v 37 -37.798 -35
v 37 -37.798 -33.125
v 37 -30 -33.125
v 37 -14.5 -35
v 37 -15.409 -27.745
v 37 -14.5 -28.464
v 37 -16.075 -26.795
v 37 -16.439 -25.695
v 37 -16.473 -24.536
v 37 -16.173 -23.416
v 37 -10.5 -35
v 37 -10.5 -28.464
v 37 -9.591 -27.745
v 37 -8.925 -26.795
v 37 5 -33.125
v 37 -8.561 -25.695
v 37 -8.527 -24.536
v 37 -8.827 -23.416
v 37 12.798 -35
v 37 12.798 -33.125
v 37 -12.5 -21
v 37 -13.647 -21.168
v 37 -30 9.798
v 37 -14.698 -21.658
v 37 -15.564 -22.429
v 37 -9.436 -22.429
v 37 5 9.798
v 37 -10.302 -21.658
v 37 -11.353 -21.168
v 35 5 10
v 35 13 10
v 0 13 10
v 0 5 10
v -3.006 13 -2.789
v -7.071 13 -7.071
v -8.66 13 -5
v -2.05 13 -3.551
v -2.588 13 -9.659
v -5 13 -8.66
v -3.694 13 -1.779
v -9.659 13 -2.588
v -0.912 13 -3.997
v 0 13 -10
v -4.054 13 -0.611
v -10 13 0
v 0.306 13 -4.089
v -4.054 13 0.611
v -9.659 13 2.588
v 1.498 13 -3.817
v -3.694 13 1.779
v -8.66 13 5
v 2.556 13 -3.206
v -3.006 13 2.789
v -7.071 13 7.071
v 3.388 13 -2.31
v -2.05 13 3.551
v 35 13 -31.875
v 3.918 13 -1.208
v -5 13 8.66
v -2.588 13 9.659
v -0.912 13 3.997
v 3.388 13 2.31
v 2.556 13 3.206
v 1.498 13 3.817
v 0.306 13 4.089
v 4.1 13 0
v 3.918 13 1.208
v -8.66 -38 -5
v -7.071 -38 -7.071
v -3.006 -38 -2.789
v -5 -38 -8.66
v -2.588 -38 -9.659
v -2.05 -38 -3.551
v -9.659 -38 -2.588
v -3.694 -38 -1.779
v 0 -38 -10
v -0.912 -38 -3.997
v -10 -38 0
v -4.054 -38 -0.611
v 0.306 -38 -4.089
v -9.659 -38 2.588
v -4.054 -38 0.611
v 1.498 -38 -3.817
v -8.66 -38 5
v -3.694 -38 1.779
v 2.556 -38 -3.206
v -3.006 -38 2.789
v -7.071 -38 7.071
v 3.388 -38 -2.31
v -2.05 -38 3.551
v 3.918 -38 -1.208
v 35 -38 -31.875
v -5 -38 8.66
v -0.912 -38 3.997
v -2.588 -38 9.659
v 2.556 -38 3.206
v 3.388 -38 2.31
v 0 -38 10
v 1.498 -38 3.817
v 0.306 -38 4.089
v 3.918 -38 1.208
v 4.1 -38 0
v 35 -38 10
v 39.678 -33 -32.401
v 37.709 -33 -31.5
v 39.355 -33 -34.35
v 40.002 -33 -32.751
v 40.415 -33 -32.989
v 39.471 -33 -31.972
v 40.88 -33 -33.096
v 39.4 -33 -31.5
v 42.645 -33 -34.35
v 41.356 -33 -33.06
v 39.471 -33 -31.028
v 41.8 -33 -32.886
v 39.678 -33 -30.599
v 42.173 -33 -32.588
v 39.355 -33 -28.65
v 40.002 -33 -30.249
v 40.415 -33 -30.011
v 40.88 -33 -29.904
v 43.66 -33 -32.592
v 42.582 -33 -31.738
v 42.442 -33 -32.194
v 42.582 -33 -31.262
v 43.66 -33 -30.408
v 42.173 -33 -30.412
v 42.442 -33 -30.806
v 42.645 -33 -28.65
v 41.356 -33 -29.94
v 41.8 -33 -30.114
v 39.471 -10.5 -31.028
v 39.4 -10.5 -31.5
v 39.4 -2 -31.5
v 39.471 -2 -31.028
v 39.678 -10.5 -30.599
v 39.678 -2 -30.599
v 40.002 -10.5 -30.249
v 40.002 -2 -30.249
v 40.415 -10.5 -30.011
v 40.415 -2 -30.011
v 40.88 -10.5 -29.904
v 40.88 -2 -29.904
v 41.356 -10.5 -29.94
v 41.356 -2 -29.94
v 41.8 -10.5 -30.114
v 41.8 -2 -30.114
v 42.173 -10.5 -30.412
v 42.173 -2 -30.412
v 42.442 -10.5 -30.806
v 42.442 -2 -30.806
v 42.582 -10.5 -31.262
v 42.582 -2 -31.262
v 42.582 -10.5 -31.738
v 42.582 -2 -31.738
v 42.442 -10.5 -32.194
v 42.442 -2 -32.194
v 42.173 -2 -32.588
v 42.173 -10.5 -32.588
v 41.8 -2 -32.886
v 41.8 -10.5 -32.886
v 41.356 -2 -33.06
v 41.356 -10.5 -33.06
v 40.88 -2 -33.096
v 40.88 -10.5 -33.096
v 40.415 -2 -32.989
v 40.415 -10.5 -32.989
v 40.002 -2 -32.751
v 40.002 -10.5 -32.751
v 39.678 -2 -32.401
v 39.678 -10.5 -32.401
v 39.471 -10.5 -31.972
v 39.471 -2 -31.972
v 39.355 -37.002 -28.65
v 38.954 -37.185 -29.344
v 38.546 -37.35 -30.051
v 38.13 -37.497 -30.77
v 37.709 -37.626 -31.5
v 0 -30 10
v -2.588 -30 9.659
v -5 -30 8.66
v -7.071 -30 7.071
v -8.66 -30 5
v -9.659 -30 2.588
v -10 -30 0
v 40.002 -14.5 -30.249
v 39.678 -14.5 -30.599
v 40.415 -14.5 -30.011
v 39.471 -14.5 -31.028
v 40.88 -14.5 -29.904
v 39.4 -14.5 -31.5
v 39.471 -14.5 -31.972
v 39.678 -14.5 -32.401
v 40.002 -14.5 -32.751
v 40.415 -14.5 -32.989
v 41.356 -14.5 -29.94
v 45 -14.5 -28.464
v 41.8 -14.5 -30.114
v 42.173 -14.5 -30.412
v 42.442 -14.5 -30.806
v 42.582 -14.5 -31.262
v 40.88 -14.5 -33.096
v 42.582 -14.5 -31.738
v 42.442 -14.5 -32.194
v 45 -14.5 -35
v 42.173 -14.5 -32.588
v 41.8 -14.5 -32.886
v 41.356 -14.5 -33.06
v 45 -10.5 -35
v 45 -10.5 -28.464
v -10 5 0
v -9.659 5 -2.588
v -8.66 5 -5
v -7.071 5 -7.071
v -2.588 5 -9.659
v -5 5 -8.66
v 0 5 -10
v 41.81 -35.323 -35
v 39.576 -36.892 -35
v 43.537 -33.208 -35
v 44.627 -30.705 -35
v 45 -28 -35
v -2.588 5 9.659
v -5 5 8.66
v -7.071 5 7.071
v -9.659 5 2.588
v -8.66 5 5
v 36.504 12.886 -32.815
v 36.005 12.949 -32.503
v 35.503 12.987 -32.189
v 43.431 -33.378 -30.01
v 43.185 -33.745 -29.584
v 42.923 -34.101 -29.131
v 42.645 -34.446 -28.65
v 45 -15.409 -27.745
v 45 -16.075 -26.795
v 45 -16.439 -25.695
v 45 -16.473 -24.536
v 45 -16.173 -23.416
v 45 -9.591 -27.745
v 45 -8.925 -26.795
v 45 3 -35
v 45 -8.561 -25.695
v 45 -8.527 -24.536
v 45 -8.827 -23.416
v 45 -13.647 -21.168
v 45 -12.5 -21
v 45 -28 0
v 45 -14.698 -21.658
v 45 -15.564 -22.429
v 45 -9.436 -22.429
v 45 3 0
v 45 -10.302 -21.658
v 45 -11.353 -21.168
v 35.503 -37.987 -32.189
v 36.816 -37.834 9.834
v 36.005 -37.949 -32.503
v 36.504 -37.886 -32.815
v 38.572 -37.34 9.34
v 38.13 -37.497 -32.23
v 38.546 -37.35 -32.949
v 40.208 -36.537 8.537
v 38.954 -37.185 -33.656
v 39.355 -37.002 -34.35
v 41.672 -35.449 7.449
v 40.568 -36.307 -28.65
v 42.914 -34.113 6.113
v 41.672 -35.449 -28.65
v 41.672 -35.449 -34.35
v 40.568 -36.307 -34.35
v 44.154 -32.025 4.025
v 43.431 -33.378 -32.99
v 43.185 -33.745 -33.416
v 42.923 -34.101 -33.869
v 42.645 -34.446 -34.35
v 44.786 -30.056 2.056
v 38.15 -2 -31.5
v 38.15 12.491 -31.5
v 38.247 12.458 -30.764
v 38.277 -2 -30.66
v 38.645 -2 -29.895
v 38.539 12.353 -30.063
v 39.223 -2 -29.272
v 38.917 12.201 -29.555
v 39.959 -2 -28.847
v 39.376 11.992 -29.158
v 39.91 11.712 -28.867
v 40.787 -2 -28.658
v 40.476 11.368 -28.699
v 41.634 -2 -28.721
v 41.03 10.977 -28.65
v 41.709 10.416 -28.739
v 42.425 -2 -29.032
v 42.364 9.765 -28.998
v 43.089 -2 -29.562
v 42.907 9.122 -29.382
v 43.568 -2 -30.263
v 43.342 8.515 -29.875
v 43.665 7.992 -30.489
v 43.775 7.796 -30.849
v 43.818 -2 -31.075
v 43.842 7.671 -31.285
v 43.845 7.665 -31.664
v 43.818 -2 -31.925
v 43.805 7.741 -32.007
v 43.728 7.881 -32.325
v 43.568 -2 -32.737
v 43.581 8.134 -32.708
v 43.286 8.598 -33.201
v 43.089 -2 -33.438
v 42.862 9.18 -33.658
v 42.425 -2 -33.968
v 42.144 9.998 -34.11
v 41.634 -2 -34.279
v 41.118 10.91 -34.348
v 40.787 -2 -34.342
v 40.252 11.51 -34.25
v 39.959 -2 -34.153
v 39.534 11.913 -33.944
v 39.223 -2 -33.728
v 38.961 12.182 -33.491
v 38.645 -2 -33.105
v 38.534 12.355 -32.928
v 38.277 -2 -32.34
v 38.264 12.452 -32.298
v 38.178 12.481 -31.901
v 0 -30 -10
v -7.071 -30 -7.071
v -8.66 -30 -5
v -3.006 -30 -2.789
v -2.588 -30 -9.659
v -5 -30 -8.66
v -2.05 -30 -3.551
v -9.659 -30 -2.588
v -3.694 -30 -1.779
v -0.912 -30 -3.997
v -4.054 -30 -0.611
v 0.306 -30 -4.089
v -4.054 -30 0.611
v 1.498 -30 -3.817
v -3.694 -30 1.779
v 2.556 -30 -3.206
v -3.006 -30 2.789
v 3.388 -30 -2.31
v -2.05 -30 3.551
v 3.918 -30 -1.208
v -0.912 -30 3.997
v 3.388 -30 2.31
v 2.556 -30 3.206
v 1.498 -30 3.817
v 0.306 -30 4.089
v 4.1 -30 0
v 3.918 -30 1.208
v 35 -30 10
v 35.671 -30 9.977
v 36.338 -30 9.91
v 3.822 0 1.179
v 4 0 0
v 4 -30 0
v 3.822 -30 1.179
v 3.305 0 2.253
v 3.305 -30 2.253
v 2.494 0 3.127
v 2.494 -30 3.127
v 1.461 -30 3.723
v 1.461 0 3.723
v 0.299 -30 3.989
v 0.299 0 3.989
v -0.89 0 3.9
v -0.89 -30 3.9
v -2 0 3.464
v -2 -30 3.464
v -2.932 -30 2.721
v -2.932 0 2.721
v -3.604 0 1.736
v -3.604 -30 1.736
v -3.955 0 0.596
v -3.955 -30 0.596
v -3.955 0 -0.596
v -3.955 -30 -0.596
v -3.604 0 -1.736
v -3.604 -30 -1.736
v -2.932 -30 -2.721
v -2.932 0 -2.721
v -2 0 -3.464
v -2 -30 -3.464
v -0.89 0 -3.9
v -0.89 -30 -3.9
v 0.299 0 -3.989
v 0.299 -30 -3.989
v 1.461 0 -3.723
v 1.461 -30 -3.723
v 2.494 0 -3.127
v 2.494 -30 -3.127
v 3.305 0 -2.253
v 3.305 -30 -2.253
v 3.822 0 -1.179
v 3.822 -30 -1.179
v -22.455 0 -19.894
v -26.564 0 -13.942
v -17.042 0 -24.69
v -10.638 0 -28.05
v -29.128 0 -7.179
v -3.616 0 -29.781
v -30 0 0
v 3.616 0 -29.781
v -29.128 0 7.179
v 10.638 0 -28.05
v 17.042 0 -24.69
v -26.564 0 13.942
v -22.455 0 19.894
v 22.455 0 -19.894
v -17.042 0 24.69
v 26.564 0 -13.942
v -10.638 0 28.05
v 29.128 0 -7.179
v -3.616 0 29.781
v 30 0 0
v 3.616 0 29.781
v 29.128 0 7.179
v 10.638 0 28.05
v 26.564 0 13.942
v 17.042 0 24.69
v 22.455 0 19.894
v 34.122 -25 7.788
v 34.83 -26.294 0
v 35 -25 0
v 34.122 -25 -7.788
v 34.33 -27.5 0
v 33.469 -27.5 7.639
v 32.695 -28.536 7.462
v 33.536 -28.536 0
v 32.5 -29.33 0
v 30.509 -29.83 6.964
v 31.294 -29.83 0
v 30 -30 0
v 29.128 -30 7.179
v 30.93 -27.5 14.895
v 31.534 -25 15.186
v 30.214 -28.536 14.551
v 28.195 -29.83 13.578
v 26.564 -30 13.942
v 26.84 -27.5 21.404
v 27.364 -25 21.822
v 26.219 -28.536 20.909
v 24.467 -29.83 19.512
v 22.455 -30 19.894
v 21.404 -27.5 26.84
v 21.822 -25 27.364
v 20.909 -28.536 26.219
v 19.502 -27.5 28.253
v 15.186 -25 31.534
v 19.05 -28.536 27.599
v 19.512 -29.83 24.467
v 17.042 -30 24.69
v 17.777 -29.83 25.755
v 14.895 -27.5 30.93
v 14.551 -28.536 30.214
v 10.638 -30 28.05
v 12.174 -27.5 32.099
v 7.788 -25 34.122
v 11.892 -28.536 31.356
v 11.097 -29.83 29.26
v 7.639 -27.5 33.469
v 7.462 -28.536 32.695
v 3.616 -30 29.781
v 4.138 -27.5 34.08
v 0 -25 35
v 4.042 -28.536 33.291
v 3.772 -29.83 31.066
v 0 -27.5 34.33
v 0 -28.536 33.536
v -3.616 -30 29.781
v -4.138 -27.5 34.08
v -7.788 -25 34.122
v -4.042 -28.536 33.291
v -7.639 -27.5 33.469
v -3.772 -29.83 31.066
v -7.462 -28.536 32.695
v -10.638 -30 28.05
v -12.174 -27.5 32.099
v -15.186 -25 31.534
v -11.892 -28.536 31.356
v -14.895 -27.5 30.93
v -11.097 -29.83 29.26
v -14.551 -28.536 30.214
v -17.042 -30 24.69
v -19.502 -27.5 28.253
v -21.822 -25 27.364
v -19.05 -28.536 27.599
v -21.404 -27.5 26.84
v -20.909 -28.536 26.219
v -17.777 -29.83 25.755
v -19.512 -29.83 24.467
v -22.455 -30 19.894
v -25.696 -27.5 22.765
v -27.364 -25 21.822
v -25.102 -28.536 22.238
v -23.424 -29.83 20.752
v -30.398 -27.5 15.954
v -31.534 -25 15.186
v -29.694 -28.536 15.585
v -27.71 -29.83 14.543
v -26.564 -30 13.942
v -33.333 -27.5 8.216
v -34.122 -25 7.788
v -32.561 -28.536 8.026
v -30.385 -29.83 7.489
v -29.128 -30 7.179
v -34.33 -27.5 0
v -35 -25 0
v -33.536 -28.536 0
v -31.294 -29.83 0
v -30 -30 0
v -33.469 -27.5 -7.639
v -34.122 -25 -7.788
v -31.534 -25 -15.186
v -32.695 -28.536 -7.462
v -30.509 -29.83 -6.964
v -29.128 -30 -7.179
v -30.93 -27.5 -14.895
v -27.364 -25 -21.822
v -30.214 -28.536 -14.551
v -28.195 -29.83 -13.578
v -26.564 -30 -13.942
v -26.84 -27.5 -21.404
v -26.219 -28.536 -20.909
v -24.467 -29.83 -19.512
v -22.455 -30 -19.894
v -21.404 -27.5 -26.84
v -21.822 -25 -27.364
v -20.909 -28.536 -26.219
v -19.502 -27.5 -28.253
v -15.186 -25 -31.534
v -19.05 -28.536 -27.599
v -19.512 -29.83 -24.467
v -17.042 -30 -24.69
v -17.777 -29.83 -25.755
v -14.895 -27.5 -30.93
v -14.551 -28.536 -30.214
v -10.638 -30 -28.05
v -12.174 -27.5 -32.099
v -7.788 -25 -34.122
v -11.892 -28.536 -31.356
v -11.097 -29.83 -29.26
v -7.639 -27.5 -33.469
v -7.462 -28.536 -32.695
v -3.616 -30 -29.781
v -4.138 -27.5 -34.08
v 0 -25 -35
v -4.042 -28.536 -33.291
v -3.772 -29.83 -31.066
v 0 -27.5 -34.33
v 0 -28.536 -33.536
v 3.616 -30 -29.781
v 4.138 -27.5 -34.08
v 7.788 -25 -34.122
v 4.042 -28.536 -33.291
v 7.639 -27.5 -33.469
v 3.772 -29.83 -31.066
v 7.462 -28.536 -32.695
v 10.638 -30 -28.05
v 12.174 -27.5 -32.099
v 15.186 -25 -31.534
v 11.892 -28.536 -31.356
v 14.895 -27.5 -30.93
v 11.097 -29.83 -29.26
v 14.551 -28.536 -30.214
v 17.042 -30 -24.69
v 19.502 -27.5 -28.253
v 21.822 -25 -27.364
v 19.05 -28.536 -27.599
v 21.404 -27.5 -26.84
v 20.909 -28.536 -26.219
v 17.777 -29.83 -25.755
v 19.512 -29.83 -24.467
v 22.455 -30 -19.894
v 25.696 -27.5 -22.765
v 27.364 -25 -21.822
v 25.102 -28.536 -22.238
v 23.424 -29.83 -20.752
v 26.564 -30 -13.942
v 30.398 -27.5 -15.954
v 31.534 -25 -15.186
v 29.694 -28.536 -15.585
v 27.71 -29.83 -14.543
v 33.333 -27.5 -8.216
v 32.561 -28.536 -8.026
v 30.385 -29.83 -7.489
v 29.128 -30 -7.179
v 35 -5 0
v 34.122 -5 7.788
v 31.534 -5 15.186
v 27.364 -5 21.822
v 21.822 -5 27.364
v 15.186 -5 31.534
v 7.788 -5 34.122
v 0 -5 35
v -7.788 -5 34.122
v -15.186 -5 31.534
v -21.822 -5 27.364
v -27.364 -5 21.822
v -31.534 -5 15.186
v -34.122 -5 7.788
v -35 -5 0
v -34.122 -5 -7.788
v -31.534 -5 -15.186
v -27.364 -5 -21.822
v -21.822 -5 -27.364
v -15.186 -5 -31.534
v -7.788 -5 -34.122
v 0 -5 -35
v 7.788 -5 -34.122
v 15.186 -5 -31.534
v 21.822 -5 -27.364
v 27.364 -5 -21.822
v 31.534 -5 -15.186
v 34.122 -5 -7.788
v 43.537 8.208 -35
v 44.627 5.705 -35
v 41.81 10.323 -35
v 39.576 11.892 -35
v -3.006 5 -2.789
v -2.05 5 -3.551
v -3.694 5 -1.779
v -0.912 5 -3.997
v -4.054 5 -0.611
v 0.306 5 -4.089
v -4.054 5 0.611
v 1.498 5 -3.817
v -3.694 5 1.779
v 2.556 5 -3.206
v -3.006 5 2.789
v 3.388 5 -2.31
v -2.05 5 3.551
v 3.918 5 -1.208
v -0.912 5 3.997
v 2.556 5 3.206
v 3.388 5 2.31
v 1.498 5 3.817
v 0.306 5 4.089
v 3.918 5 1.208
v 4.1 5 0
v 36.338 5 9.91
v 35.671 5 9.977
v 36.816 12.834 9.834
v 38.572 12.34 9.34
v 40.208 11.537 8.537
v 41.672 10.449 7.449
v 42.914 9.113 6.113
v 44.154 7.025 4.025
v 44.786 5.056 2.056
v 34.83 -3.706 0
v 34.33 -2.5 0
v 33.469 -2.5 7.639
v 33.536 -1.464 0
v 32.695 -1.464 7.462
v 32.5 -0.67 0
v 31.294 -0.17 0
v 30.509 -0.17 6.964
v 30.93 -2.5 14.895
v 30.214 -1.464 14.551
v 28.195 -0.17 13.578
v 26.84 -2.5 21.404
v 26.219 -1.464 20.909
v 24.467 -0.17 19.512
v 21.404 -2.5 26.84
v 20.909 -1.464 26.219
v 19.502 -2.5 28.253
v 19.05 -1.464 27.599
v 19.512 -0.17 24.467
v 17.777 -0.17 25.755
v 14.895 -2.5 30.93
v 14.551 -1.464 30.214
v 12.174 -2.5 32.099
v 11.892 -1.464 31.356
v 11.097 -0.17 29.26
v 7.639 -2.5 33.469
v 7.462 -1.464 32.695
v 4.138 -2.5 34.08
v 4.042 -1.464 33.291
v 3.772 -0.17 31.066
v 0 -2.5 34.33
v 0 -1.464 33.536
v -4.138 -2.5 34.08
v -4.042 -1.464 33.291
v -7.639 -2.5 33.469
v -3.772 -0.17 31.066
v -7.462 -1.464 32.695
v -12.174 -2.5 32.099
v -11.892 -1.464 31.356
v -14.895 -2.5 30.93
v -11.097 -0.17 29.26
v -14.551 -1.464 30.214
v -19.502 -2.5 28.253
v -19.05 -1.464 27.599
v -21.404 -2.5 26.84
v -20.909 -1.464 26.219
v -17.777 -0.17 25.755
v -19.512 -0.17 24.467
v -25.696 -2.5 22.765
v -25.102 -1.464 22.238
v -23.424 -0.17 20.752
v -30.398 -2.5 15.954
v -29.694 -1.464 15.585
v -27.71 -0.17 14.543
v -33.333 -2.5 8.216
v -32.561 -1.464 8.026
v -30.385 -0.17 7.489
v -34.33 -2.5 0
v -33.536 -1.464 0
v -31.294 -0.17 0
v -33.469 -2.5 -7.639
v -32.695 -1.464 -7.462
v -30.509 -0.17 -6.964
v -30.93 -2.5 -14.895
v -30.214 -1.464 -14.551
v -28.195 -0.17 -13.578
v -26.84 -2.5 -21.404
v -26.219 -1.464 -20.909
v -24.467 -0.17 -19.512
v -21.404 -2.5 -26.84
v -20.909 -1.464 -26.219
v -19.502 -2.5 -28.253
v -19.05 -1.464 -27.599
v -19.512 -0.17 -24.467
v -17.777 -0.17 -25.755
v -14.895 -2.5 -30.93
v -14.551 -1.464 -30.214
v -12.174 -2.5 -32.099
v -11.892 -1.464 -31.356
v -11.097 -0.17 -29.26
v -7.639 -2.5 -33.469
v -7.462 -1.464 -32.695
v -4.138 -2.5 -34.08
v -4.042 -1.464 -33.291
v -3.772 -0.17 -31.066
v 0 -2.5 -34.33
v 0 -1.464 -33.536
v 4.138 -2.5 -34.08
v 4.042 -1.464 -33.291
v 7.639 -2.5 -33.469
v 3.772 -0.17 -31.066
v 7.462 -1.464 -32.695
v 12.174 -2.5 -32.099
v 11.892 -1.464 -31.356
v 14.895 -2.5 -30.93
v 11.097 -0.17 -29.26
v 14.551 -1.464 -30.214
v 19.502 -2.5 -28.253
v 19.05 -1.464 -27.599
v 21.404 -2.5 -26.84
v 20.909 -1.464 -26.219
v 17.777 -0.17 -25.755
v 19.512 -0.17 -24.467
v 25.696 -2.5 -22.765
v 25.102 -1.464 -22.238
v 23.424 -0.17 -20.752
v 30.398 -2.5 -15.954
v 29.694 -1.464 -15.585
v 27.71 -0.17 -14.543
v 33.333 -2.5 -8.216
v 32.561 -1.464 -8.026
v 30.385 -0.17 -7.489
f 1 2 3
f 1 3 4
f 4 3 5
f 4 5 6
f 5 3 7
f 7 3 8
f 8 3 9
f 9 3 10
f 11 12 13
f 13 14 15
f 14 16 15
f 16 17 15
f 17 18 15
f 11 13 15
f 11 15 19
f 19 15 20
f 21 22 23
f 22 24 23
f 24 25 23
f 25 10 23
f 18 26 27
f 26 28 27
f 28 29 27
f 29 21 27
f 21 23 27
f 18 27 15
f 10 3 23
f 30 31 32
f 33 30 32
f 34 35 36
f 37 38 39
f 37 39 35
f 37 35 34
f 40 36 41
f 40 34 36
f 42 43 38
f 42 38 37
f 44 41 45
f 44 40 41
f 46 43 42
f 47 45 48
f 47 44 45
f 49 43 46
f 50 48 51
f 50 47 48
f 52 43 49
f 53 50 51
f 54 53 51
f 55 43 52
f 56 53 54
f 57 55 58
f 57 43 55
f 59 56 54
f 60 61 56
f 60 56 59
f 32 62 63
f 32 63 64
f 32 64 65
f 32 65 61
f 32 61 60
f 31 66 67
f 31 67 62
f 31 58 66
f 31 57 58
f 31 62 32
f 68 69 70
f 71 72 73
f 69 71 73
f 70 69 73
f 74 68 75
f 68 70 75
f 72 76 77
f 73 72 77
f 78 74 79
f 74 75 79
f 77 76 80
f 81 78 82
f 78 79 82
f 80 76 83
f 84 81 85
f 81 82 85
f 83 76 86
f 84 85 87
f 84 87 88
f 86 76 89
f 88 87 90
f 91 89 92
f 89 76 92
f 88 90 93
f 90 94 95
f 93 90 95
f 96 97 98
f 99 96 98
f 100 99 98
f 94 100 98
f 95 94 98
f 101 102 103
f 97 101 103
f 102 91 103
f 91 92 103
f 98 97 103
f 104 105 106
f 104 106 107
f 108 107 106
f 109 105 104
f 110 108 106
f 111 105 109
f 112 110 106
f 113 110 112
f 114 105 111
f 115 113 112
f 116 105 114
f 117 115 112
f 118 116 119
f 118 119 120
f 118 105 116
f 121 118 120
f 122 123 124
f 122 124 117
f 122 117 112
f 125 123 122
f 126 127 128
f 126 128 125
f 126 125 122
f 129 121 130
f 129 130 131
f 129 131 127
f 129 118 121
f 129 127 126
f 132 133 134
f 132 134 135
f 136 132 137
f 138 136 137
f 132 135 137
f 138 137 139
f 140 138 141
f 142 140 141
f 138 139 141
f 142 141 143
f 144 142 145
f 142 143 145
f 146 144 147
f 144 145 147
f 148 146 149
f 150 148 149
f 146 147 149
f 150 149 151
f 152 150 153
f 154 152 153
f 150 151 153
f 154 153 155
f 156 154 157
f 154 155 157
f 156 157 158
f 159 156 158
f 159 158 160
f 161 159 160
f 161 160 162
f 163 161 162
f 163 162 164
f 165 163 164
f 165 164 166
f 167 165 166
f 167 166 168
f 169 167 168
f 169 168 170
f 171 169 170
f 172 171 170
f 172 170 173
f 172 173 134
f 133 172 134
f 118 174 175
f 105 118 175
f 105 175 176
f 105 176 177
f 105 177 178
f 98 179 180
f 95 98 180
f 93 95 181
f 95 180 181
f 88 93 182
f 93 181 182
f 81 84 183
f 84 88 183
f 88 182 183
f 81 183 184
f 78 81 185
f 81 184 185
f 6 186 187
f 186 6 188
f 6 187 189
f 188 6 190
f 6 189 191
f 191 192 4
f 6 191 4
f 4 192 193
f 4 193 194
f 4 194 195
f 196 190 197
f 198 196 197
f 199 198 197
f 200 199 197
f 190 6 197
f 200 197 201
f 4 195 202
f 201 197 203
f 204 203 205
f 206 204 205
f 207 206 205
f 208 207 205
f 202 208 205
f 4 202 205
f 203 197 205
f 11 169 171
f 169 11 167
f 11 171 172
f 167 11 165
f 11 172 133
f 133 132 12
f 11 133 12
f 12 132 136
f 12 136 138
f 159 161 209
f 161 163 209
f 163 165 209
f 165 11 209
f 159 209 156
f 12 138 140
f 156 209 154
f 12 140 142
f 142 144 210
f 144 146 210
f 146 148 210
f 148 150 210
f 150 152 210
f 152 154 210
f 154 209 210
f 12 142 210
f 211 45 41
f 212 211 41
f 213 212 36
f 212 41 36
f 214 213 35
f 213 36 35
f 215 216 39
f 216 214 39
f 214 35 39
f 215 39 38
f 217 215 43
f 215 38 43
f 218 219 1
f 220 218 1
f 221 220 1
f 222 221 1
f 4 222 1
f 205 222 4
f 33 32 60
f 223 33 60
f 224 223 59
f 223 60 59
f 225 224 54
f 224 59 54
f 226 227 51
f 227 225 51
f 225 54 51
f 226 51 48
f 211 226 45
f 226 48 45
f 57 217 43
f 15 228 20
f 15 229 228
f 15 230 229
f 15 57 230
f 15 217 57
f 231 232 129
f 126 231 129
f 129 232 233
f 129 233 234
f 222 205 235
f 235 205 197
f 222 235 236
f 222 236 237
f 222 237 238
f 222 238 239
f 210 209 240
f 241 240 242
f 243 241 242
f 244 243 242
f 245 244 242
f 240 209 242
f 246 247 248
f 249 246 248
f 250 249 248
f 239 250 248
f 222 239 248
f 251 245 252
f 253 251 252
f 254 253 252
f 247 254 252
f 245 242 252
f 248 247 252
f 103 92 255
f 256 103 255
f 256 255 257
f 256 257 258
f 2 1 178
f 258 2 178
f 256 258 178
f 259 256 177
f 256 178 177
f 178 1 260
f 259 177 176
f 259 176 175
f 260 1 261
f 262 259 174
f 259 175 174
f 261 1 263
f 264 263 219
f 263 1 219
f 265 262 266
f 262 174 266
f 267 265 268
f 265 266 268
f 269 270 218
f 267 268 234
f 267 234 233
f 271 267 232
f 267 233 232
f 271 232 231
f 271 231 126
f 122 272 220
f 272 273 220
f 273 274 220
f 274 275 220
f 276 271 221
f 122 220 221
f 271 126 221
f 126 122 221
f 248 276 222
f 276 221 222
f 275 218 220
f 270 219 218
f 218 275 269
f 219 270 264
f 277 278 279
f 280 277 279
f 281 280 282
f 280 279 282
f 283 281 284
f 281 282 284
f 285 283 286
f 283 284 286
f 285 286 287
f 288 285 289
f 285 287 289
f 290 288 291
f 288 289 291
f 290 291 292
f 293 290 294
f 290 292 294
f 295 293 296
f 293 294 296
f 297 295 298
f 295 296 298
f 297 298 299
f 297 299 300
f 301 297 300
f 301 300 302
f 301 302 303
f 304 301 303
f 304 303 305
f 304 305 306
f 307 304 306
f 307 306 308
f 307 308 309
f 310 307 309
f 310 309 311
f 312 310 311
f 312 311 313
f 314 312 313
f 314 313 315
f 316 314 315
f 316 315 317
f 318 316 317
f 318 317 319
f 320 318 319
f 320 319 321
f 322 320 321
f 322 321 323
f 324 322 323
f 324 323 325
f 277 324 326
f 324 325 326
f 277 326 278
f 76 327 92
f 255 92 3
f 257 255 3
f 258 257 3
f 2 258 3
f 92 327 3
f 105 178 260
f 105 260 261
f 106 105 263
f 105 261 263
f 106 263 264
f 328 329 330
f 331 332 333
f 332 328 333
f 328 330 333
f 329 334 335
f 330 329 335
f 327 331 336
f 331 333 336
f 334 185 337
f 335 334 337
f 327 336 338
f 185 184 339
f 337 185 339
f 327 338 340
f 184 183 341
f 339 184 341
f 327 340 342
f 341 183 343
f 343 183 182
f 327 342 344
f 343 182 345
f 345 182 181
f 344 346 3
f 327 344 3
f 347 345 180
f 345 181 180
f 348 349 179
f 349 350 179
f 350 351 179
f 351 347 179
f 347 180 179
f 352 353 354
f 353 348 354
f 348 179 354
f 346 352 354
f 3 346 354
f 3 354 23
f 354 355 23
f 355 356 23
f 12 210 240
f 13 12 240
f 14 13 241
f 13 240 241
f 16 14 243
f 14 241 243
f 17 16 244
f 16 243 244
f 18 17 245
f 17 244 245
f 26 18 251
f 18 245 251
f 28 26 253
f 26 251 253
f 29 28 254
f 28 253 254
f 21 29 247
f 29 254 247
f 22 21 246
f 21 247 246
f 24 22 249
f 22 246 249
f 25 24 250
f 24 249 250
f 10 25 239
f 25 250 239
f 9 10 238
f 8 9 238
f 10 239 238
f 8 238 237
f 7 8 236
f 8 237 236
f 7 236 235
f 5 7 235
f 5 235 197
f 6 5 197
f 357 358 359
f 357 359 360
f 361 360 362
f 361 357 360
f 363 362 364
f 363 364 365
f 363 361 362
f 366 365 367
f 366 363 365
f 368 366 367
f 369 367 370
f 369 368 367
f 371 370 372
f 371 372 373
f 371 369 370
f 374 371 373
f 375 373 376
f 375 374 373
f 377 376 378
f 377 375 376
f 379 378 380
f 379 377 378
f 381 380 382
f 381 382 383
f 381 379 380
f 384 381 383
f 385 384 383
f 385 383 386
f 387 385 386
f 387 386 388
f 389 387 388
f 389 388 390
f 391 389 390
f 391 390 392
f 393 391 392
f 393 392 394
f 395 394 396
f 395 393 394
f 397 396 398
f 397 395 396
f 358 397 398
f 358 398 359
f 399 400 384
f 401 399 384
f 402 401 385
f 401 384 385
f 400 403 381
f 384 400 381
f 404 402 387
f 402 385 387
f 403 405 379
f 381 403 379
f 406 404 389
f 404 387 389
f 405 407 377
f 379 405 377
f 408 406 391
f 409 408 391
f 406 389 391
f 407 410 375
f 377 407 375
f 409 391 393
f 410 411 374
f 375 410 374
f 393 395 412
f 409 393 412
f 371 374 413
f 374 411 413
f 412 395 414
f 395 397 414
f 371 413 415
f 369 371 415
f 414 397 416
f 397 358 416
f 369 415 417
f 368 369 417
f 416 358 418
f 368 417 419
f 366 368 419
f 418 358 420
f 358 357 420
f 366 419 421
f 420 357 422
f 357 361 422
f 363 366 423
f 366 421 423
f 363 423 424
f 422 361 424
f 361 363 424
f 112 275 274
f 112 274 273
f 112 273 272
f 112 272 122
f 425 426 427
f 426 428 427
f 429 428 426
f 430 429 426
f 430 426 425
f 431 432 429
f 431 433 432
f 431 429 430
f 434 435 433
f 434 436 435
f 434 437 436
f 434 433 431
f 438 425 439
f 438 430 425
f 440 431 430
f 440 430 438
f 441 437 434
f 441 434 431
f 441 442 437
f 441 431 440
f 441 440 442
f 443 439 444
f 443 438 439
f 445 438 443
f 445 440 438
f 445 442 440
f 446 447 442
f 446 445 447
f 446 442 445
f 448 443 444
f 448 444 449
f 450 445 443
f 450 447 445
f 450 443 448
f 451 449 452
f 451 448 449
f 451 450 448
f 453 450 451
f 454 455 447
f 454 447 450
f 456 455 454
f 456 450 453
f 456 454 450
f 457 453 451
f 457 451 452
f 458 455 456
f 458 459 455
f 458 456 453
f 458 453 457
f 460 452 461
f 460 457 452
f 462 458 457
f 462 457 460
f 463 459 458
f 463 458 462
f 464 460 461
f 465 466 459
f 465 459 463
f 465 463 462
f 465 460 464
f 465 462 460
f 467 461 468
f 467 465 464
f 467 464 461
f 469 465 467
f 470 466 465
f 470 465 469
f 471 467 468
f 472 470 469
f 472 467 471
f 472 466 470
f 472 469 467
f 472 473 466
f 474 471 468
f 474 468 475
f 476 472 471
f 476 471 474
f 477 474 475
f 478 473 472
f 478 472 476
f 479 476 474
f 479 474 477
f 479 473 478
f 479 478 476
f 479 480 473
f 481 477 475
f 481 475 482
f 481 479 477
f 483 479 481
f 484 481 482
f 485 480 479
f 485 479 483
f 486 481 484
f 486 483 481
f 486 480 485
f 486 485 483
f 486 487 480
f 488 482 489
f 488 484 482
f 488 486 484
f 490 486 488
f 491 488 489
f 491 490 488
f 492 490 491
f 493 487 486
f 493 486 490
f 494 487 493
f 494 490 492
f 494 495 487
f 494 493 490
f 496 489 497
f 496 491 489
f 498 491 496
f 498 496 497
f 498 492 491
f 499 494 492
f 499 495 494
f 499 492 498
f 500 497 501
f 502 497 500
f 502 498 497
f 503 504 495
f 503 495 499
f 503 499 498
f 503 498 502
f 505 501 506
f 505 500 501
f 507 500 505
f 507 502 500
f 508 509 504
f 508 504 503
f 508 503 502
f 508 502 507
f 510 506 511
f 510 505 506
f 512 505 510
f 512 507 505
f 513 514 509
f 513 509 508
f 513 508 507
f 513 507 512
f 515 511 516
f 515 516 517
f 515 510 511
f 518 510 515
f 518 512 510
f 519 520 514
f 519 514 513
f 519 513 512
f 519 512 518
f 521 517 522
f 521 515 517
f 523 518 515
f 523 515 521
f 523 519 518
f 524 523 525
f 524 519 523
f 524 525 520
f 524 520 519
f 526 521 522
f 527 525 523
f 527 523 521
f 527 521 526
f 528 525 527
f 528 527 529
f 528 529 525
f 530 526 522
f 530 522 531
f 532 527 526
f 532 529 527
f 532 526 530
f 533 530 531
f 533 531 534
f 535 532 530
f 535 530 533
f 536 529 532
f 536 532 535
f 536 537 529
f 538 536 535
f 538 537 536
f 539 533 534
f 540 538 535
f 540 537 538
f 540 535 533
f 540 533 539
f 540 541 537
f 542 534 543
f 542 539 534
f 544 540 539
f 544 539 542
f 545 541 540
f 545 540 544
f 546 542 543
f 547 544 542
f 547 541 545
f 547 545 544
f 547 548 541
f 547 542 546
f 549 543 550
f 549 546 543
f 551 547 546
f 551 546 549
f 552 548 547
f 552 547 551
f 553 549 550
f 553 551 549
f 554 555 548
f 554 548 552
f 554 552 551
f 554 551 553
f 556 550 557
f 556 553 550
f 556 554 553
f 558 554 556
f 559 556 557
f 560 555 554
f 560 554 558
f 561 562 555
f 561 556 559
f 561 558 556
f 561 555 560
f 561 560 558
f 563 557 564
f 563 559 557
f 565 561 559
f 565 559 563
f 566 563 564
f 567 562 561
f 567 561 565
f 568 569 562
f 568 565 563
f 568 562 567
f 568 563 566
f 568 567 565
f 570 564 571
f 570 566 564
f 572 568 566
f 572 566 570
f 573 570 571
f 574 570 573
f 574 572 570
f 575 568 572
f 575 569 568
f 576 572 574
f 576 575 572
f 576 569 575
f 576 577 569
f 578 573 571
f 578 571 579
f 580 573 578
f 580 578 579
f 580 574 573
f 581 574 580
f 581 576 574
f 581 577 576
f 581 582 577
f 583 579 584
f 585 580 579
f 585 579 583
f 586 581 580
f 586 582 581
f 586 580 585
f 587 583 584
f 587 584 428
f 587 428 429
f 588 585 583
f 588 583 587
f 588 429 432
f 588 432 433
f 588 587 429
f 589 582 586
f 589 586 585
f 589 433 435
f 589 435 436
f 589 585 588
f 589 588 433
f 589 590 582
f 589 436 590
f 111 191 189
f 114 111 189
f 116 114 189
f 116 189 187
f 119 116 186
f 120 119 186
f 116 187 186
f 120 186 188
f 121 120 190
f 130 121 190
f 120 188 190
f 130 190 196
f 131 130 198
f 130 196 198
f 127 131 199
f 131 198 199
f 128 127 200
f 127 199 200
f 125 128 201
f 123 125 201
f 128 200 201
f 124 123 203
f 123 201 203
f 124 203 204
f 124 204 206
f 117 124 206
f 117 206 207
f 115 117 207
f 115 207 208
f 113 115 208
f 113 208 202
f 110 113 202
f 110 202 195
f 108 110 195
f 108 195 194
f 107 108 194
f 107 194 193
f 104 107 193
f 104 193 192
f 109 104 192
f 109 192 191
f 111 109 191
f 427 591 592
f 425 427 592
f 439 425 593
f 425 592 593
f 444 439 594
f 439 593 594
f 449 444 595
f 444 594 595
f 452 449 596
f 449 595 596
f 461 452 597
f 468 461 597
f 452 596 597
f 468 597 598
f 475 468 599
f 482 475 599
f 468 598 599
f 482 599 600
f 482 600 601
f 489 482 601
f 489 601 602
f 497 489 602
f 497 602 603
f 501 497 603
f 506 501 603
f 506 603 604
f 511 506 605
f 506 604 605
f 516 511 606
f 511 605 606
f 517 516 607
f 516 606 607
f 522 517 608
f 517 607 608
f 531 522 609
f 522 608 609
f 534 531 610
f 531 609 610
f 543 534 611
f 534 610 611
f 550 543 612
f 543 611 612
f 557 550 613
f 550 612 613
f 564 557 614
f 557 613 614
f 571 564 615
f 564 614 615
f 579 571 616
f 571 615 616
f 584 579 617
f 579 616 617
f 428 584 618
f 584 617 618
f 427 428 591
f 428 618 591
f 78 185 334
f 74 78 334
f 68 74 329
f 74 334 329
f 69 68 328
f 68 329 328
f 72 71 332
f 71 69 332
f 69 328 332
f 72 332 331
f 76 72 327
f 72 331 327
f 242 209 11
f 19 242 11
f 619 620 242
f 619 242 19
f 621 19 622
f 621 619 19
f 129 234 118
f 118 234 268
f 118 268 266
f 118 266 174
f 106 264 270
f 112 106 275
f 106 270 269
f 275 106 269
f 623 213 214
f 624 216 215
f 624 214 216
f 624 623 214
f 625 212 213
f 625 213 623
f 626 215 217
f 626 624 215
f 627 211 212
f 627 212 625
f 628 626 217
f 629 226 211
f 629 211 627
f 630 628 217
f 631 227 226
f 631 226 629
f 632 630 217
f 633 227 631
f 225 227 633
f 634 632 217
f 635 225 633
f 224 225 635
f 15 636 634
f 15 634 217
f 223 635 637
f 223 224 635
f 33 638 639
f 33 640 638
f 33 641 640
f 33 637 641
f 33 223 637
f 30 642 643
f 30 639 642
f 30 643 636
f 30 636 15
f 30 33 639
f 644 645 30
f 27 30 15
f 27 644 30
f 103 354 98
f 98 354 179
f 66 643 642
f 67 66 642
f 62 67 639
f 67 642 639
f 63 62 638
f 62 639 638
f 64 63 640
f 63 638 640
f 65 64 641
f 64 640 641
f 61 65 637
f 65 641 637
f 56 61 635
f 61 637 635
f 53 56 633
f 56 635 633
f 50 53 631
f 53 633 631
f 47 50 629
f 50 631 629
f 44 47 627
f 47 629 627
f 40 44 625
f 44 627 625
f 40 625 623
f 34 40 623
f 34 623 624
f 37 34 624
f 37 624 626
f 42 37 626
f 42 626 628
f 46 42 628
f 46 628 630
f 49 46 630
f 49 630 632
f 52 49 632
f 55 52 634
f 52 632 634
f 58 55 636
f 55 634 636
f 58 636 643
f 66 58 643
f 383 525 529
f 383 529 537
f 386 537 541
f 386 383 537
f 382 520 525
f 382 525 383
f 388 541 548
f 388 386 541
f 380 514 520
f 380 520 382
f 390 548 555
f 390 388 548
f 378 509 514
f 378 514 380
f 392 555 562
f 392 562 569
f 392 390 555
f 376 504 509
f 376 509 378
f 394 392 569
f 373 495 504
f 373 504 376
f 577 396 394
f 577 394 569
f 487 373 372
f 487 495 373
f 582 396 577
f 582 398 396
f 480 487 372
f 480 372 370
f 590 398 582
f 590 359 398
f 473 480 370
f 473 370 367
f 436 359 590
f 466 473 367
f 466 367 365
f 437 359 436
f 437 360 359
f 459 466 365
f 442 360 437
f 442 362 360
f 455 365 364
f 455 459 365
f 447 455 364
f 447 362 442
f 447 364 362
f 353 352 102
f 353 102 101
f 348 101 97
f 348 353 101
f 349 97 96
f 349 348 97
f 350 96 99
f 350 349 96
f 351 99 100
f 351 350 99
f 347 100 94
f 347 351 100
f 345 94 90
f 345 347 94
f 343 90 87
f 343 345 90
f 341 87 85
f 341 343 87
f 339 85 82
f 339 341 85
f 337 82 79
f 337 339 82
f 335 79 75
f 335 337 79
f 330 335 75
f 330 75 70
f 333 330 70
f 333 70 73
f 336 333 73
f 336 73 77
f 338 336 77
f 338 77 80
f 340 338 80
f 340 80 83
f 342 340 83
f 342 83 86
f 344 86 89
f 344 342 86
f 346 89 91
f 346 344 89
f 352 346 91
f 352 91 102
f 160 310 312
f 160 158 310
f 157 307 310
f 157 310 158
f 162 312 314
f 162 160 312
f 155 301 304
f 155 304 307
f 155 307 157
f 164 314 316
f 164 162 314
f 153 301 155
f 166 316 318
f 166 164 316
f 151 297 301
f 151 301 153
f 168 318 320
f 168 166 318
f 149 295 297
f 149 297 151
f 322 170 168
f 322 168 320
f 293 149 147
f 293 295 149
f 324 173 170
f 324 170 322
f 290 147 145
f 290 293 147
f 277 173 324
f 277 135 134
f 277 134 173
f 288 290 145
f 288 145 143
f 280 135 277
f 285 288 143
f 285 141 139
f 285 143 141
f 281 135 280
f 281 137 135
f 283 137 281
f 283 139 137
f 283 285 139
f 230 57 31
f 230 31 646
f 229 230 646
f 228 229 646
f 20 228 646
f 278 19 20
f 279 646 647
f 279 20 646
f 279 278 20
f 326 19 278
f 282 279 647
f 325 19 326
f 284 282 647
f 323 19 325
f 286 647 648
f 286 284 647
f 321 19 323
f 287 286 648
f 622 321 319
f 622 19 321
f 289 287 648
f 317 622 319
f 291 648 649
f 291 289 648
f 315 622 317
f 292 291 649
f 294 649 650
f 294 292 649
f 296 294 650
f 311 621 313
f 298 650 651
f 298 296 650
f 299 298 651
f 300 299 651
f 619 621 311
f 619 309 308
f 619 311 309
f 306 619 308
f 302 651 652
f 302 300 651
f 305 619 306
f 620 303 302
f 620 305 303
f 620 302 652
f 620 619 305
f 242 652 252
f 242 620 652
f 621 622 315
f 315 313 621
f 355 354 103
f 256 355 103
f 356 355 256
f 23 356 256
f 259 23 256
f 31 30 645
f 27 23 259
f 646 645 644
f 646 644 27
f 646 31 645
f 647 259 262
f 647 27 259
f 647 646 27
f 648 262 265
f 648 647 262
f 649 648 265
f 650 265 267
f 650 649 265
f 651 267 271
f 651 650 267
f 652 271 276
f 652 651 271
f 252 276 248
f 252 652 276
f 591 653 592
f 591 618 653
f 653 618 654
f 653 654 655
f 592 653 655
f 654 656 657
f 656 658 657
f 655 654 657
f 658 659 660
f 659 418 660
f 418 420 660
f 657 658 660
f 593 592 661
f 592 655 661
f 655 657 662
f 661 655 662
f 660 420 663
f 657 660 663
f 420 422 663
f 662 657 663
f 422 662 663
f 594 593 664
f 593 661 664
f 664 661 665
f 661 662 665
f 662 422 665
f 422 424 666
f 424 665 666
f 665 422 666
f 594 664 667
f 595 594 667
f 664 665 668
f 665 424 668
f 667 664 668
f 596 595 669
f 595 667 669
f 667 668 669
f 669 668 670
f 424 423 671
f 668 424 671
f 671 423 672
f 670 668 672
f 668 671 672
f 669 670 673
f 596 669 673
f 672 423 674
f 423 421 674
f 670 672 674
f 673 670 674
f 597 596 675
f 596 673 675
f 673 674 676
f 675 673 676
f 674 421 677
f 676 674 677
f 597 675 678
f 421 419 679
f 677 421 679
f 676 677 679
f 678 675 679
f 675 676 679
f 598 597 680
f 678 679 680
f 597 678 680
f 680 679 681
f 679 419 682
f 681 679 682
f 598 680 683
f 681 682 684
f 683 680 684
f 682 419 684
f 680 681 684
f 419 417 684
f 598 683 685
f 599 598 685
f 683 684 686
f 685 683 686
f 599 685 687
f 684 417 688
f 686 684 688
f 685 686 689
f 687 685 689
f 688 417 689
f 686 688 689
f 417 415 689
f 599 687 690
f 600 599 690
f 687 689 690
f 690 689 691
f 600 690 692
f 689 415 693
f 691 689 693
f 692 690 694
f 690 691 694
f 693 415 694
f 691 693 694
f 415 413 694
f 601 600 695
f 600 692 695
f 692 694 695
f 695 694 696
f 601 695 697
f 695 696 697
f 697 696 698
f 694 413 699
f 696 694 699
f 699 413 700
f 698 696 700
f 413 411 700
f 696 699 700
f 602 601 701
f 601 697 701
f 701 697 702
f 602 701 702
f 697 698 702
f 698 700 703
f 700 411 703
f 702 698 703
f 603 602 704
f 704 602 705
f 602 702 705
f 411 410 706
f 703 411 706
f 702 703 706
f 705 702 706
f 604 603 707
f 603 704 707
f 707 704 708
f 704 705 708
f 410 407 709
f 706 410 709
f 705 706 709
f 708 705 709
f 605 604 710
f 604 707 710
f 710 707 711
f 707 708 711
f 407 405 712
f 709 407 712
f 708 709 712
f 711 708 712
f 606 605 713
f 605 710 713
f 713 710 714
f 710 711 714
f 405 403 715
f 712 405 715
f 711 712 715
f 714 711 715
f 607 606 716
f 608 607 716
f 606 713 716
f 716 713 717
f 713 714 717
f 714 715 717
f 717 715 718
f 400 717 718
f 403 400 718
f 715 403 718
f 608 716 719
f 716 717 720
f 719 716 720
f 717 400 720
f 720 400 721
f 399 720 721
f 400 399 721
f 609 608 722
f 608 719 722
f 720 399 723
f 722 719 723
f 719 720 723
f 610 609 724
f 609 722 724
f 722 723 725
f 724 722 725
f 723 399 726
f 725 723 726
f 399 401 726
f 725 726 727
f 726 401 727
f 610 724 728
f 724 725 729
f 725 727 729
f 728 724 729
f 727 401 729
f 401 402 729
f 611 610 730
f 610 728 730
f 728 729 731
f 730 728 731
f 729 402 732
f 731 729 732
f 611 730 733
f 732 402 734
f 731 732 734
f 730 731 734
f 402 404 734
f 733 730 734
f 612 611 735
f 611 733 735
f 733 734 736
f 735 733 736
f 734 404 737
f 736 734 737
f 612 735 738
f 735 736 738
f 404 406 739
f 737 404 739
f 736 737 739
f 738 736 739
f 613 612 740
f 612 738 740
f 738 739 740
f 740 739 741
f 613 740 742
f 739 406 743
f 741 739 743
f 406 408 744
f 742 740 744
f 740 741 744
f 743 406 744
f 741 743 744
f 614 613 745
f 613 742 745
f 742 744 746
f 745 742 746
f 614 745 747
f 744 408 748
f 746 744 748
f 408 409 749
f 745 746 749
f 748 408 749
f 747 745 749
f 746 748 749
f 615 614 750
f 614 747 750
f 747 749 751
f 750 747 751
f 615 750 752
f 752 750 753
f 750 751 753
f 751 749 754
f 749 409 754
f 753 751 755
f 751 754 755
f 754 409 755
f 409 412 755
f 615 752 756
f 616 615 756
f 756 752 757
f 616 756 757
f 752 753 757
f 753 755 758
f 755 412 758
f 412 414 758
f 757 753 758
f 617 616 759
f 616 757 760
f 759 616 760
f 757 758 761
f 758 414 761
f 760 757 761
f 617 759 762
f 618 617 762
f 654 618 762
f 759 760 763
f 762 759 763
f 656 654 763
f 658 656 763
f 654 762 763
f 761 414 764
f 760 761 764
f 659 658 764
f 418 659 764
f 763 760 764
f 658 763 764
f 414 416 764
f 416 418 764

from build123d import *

# Parameters (mm, degrees)
F0_R         = 35
F0_R_2       = 4
F1_DEPTH     = 30
F2_R         = 5
F3_R         = 4.1
F4_DEPTH     = 8
F7_W         = 51
F7_H         = 45
F8_DEPTH     = 8
F11_DEPTH    = 8
F12_R        = 1.6
F13_DEPTH    = 51
F14_R        = 2.85
F15_DEPTH    = 15
F17_DEPTH    = 5
F18_T1_DEPTH = 58
F18_T3_DEPTH = 58
F18_T5_DEPTH = 101
F18_T7_DEPTH = 95


# Not quite as in the source:
# - a fillet or chamfer that OpenCascade refuses, or shapes differently, is made with other operations: its cross-section is extruded or revolved along the edge and cut away or added


with BuildPart() as f1:
    # F0 (on Front) → F1 (new body)
    with BuildSketch(Plane.XZ):
        Circle(F0_R)
        Circle(F0_R_2, mode=Mode.SUBTRACT)
    extrude(amount=F1_DEPTH)

    # F2
    f2_edges = [f1.edges().sort_by_distance(p)[0] for p in [
        (-35, -30, 0),
        (-35, 0, 0),
    ]]
    fillet(f2_edges, radius=F2_R)


with BuildPart() as f4:
    # F3 (on face) → F4 (new body)
    with BuildSketch(Plane.XZ.offset(30)):
        Polygon((45, 10), (0, 10), (-10, 10), (-10, -10), (0, -10), (40, -35), (45, -35), align=None)
        Circle(F3_R, mode=Mode.SUBTRACT)
    extrude(amount=F4_DEPTH)


with BuildPart() as f5_1:
    # F5: instance of F4
    add(f4.part.mirror(Plane(origin=(22.6623991549, -30, -7.1637600407), x_dir=(-1, 0, 0), z_dir=(0, 1, 0))))


with BuildPart() as f5_1_1:
    # F6: moved
    add(f5_1.part.moved(Location((0, 35, 0))))


with BuildPart() as f8:
    # F7 (on face) → F8 (new body)
    with BuildSketch(Plane.YZ.offset(45)):
        with Locations((-12.5, -12.5)):
            Rectangle(F7_W, F7_H)
    extrude(amount=-F8_DEPTH)


with BuildPart() as f4_1:
    add(f4.part)

    # F9: union F8, F5_1
    add(f8.part)
    add(f5_1_1.part)

    # F10 (on face) → F11 (cut)
    with BuildSketch(Plane.YZ.offset(45)):
        with BuildLine():
            Line((-14.5, -35), (-12.5, -35))
            Line((-12.5, -35), (-10.5, -35))
            Line((-10.5, -35), (-10.5, -28.4641016151))
            ThreePointArc((-10.5, -28.4641016151), (-12.5, -21), (-14.5, -28.4641016151))
            Line((-14.5, -28.4641016151), (-14.5, -35))
        make_face()
    extrude(amount=-F11_DEPTH, mode=Mode.SUBTRACT)

    # F12 (on face) → F13 (cut)
    with BuildSketch(Plane(origin=(0, 13, 0), x_dir=(-1, 0, 0), z_dir=(0, 1, 0))):
        with Locations((-41, -31.5)):
            Circle(F12_R)
    extrude(amount=-F13_DEPTH, mode=Mode.SUBTRACT)

    # F14 (on face) → F15 (cut)
    with BuildSketch(Plane(origin=(0, 13, 0), x_dir=(-1, 0, 0), z_dir=(0, 1, 0))):
        with Locations((-41, -31.5)):
            Circle(F14_R)
    extrude(amount=-F15_DEPTH, mode=Mode.SUBTRACT)

    # F16 (on face) → F17 (cut)
    with BuildSketch(Plane.XZ.offset(38)):
        Polygon((42.6454482672, -28.65), (39.3545517328, -28.65), (37.7091034656, -31.5), (39.3545517328, -34.35), (42.6454482672, -34.35), (44.2908965344, -31.5), align=None)
    extrude(amount=-F17_DEPTH, mode=Mode.SUBTRACT)

    # F18: fillet of radius 10 on 7 edges, made by hand

    # F18_s2 → F18_t1 (cut)
    with BuildSketch(Plane.XZ.offset(5)):
        with BuildLine():
            ThreePointArc((-10, 0), (-7.0710678119, -7.0710678119), (0, -10))
            Line((0, -10), (-10, -10))
            Line((-10, -10), (-10, 0))
        make_face()
        with BuildLine():
            ThreePointArc((0, 10), (-7.0710678119, 7.0710678119), (-10, 0))
            Line((-10, 0), (-10, 10))
            Line((-10, 10), (0, 10))
        make_face()
    extrude(amount=F18_T1_DEPTH, mode=Mode.SUBTRACT)

    # F18_s4 → F18_t3 (cut)
    with BuildSketch(Plane.XZ.offset(-38)):
        with BuildLine():
            ThreePointArc((-10, 0), (-7.0710678119, -7.0710678119), (0, -10))
            Line((0, -10), (-10, -10))
            Line((-10, -10), (-10, 0))
        make_face()
        with BuildLine():
            ThreePointArc((0, 10), (-7.0710678119, 7.0710678119), (-10, 0))
            Line((-10, 0), (-10, 10))
            Line((-10, 10), (0, 10))
        make_face()
    extrude(amount=F18_T3_DEPTH, mode=Mode.SUBTRACT)

    # F18_s6 → F18_t5 (cut)
    with BuildSketch(Plane.XZ.offset(-38)):
        with BuildLine():
            ThreePointArc((35, 10), (42.0710678119, 7.0710678119), (45, 0))
            Line((45, 0), (45, 10))
            Line((45, 10), (35, 10))
        make_face()
    extrude(amount=F18_T5_DEPTH, mode=Mode.SUBTRACT)

    # F18_s8 → F18_t7 (cut)
    with BuildSketch(Plane.XY.offset(-60)):
        with BuildLine():
            ThreePointArc((35, 13), (42.0710678119, 10.0710678119), (45, 3))
            Line((45, 3), (45, 13))
            Line((45, 13), (35, 13))
        make_face()
        with BuildLine():
            ThreePointArc((35, -38), (42.0710678119, -35.0710678119), (45, -28))
            Line((45, -28), (45, -38))
            Line((45, -38), (35, -38))
        make_face()
    extrude(amount=F18_T7_DEPTH, mode=Mode.SUBTRACT)


solid = Compound([f1.part, f4_1.part])
